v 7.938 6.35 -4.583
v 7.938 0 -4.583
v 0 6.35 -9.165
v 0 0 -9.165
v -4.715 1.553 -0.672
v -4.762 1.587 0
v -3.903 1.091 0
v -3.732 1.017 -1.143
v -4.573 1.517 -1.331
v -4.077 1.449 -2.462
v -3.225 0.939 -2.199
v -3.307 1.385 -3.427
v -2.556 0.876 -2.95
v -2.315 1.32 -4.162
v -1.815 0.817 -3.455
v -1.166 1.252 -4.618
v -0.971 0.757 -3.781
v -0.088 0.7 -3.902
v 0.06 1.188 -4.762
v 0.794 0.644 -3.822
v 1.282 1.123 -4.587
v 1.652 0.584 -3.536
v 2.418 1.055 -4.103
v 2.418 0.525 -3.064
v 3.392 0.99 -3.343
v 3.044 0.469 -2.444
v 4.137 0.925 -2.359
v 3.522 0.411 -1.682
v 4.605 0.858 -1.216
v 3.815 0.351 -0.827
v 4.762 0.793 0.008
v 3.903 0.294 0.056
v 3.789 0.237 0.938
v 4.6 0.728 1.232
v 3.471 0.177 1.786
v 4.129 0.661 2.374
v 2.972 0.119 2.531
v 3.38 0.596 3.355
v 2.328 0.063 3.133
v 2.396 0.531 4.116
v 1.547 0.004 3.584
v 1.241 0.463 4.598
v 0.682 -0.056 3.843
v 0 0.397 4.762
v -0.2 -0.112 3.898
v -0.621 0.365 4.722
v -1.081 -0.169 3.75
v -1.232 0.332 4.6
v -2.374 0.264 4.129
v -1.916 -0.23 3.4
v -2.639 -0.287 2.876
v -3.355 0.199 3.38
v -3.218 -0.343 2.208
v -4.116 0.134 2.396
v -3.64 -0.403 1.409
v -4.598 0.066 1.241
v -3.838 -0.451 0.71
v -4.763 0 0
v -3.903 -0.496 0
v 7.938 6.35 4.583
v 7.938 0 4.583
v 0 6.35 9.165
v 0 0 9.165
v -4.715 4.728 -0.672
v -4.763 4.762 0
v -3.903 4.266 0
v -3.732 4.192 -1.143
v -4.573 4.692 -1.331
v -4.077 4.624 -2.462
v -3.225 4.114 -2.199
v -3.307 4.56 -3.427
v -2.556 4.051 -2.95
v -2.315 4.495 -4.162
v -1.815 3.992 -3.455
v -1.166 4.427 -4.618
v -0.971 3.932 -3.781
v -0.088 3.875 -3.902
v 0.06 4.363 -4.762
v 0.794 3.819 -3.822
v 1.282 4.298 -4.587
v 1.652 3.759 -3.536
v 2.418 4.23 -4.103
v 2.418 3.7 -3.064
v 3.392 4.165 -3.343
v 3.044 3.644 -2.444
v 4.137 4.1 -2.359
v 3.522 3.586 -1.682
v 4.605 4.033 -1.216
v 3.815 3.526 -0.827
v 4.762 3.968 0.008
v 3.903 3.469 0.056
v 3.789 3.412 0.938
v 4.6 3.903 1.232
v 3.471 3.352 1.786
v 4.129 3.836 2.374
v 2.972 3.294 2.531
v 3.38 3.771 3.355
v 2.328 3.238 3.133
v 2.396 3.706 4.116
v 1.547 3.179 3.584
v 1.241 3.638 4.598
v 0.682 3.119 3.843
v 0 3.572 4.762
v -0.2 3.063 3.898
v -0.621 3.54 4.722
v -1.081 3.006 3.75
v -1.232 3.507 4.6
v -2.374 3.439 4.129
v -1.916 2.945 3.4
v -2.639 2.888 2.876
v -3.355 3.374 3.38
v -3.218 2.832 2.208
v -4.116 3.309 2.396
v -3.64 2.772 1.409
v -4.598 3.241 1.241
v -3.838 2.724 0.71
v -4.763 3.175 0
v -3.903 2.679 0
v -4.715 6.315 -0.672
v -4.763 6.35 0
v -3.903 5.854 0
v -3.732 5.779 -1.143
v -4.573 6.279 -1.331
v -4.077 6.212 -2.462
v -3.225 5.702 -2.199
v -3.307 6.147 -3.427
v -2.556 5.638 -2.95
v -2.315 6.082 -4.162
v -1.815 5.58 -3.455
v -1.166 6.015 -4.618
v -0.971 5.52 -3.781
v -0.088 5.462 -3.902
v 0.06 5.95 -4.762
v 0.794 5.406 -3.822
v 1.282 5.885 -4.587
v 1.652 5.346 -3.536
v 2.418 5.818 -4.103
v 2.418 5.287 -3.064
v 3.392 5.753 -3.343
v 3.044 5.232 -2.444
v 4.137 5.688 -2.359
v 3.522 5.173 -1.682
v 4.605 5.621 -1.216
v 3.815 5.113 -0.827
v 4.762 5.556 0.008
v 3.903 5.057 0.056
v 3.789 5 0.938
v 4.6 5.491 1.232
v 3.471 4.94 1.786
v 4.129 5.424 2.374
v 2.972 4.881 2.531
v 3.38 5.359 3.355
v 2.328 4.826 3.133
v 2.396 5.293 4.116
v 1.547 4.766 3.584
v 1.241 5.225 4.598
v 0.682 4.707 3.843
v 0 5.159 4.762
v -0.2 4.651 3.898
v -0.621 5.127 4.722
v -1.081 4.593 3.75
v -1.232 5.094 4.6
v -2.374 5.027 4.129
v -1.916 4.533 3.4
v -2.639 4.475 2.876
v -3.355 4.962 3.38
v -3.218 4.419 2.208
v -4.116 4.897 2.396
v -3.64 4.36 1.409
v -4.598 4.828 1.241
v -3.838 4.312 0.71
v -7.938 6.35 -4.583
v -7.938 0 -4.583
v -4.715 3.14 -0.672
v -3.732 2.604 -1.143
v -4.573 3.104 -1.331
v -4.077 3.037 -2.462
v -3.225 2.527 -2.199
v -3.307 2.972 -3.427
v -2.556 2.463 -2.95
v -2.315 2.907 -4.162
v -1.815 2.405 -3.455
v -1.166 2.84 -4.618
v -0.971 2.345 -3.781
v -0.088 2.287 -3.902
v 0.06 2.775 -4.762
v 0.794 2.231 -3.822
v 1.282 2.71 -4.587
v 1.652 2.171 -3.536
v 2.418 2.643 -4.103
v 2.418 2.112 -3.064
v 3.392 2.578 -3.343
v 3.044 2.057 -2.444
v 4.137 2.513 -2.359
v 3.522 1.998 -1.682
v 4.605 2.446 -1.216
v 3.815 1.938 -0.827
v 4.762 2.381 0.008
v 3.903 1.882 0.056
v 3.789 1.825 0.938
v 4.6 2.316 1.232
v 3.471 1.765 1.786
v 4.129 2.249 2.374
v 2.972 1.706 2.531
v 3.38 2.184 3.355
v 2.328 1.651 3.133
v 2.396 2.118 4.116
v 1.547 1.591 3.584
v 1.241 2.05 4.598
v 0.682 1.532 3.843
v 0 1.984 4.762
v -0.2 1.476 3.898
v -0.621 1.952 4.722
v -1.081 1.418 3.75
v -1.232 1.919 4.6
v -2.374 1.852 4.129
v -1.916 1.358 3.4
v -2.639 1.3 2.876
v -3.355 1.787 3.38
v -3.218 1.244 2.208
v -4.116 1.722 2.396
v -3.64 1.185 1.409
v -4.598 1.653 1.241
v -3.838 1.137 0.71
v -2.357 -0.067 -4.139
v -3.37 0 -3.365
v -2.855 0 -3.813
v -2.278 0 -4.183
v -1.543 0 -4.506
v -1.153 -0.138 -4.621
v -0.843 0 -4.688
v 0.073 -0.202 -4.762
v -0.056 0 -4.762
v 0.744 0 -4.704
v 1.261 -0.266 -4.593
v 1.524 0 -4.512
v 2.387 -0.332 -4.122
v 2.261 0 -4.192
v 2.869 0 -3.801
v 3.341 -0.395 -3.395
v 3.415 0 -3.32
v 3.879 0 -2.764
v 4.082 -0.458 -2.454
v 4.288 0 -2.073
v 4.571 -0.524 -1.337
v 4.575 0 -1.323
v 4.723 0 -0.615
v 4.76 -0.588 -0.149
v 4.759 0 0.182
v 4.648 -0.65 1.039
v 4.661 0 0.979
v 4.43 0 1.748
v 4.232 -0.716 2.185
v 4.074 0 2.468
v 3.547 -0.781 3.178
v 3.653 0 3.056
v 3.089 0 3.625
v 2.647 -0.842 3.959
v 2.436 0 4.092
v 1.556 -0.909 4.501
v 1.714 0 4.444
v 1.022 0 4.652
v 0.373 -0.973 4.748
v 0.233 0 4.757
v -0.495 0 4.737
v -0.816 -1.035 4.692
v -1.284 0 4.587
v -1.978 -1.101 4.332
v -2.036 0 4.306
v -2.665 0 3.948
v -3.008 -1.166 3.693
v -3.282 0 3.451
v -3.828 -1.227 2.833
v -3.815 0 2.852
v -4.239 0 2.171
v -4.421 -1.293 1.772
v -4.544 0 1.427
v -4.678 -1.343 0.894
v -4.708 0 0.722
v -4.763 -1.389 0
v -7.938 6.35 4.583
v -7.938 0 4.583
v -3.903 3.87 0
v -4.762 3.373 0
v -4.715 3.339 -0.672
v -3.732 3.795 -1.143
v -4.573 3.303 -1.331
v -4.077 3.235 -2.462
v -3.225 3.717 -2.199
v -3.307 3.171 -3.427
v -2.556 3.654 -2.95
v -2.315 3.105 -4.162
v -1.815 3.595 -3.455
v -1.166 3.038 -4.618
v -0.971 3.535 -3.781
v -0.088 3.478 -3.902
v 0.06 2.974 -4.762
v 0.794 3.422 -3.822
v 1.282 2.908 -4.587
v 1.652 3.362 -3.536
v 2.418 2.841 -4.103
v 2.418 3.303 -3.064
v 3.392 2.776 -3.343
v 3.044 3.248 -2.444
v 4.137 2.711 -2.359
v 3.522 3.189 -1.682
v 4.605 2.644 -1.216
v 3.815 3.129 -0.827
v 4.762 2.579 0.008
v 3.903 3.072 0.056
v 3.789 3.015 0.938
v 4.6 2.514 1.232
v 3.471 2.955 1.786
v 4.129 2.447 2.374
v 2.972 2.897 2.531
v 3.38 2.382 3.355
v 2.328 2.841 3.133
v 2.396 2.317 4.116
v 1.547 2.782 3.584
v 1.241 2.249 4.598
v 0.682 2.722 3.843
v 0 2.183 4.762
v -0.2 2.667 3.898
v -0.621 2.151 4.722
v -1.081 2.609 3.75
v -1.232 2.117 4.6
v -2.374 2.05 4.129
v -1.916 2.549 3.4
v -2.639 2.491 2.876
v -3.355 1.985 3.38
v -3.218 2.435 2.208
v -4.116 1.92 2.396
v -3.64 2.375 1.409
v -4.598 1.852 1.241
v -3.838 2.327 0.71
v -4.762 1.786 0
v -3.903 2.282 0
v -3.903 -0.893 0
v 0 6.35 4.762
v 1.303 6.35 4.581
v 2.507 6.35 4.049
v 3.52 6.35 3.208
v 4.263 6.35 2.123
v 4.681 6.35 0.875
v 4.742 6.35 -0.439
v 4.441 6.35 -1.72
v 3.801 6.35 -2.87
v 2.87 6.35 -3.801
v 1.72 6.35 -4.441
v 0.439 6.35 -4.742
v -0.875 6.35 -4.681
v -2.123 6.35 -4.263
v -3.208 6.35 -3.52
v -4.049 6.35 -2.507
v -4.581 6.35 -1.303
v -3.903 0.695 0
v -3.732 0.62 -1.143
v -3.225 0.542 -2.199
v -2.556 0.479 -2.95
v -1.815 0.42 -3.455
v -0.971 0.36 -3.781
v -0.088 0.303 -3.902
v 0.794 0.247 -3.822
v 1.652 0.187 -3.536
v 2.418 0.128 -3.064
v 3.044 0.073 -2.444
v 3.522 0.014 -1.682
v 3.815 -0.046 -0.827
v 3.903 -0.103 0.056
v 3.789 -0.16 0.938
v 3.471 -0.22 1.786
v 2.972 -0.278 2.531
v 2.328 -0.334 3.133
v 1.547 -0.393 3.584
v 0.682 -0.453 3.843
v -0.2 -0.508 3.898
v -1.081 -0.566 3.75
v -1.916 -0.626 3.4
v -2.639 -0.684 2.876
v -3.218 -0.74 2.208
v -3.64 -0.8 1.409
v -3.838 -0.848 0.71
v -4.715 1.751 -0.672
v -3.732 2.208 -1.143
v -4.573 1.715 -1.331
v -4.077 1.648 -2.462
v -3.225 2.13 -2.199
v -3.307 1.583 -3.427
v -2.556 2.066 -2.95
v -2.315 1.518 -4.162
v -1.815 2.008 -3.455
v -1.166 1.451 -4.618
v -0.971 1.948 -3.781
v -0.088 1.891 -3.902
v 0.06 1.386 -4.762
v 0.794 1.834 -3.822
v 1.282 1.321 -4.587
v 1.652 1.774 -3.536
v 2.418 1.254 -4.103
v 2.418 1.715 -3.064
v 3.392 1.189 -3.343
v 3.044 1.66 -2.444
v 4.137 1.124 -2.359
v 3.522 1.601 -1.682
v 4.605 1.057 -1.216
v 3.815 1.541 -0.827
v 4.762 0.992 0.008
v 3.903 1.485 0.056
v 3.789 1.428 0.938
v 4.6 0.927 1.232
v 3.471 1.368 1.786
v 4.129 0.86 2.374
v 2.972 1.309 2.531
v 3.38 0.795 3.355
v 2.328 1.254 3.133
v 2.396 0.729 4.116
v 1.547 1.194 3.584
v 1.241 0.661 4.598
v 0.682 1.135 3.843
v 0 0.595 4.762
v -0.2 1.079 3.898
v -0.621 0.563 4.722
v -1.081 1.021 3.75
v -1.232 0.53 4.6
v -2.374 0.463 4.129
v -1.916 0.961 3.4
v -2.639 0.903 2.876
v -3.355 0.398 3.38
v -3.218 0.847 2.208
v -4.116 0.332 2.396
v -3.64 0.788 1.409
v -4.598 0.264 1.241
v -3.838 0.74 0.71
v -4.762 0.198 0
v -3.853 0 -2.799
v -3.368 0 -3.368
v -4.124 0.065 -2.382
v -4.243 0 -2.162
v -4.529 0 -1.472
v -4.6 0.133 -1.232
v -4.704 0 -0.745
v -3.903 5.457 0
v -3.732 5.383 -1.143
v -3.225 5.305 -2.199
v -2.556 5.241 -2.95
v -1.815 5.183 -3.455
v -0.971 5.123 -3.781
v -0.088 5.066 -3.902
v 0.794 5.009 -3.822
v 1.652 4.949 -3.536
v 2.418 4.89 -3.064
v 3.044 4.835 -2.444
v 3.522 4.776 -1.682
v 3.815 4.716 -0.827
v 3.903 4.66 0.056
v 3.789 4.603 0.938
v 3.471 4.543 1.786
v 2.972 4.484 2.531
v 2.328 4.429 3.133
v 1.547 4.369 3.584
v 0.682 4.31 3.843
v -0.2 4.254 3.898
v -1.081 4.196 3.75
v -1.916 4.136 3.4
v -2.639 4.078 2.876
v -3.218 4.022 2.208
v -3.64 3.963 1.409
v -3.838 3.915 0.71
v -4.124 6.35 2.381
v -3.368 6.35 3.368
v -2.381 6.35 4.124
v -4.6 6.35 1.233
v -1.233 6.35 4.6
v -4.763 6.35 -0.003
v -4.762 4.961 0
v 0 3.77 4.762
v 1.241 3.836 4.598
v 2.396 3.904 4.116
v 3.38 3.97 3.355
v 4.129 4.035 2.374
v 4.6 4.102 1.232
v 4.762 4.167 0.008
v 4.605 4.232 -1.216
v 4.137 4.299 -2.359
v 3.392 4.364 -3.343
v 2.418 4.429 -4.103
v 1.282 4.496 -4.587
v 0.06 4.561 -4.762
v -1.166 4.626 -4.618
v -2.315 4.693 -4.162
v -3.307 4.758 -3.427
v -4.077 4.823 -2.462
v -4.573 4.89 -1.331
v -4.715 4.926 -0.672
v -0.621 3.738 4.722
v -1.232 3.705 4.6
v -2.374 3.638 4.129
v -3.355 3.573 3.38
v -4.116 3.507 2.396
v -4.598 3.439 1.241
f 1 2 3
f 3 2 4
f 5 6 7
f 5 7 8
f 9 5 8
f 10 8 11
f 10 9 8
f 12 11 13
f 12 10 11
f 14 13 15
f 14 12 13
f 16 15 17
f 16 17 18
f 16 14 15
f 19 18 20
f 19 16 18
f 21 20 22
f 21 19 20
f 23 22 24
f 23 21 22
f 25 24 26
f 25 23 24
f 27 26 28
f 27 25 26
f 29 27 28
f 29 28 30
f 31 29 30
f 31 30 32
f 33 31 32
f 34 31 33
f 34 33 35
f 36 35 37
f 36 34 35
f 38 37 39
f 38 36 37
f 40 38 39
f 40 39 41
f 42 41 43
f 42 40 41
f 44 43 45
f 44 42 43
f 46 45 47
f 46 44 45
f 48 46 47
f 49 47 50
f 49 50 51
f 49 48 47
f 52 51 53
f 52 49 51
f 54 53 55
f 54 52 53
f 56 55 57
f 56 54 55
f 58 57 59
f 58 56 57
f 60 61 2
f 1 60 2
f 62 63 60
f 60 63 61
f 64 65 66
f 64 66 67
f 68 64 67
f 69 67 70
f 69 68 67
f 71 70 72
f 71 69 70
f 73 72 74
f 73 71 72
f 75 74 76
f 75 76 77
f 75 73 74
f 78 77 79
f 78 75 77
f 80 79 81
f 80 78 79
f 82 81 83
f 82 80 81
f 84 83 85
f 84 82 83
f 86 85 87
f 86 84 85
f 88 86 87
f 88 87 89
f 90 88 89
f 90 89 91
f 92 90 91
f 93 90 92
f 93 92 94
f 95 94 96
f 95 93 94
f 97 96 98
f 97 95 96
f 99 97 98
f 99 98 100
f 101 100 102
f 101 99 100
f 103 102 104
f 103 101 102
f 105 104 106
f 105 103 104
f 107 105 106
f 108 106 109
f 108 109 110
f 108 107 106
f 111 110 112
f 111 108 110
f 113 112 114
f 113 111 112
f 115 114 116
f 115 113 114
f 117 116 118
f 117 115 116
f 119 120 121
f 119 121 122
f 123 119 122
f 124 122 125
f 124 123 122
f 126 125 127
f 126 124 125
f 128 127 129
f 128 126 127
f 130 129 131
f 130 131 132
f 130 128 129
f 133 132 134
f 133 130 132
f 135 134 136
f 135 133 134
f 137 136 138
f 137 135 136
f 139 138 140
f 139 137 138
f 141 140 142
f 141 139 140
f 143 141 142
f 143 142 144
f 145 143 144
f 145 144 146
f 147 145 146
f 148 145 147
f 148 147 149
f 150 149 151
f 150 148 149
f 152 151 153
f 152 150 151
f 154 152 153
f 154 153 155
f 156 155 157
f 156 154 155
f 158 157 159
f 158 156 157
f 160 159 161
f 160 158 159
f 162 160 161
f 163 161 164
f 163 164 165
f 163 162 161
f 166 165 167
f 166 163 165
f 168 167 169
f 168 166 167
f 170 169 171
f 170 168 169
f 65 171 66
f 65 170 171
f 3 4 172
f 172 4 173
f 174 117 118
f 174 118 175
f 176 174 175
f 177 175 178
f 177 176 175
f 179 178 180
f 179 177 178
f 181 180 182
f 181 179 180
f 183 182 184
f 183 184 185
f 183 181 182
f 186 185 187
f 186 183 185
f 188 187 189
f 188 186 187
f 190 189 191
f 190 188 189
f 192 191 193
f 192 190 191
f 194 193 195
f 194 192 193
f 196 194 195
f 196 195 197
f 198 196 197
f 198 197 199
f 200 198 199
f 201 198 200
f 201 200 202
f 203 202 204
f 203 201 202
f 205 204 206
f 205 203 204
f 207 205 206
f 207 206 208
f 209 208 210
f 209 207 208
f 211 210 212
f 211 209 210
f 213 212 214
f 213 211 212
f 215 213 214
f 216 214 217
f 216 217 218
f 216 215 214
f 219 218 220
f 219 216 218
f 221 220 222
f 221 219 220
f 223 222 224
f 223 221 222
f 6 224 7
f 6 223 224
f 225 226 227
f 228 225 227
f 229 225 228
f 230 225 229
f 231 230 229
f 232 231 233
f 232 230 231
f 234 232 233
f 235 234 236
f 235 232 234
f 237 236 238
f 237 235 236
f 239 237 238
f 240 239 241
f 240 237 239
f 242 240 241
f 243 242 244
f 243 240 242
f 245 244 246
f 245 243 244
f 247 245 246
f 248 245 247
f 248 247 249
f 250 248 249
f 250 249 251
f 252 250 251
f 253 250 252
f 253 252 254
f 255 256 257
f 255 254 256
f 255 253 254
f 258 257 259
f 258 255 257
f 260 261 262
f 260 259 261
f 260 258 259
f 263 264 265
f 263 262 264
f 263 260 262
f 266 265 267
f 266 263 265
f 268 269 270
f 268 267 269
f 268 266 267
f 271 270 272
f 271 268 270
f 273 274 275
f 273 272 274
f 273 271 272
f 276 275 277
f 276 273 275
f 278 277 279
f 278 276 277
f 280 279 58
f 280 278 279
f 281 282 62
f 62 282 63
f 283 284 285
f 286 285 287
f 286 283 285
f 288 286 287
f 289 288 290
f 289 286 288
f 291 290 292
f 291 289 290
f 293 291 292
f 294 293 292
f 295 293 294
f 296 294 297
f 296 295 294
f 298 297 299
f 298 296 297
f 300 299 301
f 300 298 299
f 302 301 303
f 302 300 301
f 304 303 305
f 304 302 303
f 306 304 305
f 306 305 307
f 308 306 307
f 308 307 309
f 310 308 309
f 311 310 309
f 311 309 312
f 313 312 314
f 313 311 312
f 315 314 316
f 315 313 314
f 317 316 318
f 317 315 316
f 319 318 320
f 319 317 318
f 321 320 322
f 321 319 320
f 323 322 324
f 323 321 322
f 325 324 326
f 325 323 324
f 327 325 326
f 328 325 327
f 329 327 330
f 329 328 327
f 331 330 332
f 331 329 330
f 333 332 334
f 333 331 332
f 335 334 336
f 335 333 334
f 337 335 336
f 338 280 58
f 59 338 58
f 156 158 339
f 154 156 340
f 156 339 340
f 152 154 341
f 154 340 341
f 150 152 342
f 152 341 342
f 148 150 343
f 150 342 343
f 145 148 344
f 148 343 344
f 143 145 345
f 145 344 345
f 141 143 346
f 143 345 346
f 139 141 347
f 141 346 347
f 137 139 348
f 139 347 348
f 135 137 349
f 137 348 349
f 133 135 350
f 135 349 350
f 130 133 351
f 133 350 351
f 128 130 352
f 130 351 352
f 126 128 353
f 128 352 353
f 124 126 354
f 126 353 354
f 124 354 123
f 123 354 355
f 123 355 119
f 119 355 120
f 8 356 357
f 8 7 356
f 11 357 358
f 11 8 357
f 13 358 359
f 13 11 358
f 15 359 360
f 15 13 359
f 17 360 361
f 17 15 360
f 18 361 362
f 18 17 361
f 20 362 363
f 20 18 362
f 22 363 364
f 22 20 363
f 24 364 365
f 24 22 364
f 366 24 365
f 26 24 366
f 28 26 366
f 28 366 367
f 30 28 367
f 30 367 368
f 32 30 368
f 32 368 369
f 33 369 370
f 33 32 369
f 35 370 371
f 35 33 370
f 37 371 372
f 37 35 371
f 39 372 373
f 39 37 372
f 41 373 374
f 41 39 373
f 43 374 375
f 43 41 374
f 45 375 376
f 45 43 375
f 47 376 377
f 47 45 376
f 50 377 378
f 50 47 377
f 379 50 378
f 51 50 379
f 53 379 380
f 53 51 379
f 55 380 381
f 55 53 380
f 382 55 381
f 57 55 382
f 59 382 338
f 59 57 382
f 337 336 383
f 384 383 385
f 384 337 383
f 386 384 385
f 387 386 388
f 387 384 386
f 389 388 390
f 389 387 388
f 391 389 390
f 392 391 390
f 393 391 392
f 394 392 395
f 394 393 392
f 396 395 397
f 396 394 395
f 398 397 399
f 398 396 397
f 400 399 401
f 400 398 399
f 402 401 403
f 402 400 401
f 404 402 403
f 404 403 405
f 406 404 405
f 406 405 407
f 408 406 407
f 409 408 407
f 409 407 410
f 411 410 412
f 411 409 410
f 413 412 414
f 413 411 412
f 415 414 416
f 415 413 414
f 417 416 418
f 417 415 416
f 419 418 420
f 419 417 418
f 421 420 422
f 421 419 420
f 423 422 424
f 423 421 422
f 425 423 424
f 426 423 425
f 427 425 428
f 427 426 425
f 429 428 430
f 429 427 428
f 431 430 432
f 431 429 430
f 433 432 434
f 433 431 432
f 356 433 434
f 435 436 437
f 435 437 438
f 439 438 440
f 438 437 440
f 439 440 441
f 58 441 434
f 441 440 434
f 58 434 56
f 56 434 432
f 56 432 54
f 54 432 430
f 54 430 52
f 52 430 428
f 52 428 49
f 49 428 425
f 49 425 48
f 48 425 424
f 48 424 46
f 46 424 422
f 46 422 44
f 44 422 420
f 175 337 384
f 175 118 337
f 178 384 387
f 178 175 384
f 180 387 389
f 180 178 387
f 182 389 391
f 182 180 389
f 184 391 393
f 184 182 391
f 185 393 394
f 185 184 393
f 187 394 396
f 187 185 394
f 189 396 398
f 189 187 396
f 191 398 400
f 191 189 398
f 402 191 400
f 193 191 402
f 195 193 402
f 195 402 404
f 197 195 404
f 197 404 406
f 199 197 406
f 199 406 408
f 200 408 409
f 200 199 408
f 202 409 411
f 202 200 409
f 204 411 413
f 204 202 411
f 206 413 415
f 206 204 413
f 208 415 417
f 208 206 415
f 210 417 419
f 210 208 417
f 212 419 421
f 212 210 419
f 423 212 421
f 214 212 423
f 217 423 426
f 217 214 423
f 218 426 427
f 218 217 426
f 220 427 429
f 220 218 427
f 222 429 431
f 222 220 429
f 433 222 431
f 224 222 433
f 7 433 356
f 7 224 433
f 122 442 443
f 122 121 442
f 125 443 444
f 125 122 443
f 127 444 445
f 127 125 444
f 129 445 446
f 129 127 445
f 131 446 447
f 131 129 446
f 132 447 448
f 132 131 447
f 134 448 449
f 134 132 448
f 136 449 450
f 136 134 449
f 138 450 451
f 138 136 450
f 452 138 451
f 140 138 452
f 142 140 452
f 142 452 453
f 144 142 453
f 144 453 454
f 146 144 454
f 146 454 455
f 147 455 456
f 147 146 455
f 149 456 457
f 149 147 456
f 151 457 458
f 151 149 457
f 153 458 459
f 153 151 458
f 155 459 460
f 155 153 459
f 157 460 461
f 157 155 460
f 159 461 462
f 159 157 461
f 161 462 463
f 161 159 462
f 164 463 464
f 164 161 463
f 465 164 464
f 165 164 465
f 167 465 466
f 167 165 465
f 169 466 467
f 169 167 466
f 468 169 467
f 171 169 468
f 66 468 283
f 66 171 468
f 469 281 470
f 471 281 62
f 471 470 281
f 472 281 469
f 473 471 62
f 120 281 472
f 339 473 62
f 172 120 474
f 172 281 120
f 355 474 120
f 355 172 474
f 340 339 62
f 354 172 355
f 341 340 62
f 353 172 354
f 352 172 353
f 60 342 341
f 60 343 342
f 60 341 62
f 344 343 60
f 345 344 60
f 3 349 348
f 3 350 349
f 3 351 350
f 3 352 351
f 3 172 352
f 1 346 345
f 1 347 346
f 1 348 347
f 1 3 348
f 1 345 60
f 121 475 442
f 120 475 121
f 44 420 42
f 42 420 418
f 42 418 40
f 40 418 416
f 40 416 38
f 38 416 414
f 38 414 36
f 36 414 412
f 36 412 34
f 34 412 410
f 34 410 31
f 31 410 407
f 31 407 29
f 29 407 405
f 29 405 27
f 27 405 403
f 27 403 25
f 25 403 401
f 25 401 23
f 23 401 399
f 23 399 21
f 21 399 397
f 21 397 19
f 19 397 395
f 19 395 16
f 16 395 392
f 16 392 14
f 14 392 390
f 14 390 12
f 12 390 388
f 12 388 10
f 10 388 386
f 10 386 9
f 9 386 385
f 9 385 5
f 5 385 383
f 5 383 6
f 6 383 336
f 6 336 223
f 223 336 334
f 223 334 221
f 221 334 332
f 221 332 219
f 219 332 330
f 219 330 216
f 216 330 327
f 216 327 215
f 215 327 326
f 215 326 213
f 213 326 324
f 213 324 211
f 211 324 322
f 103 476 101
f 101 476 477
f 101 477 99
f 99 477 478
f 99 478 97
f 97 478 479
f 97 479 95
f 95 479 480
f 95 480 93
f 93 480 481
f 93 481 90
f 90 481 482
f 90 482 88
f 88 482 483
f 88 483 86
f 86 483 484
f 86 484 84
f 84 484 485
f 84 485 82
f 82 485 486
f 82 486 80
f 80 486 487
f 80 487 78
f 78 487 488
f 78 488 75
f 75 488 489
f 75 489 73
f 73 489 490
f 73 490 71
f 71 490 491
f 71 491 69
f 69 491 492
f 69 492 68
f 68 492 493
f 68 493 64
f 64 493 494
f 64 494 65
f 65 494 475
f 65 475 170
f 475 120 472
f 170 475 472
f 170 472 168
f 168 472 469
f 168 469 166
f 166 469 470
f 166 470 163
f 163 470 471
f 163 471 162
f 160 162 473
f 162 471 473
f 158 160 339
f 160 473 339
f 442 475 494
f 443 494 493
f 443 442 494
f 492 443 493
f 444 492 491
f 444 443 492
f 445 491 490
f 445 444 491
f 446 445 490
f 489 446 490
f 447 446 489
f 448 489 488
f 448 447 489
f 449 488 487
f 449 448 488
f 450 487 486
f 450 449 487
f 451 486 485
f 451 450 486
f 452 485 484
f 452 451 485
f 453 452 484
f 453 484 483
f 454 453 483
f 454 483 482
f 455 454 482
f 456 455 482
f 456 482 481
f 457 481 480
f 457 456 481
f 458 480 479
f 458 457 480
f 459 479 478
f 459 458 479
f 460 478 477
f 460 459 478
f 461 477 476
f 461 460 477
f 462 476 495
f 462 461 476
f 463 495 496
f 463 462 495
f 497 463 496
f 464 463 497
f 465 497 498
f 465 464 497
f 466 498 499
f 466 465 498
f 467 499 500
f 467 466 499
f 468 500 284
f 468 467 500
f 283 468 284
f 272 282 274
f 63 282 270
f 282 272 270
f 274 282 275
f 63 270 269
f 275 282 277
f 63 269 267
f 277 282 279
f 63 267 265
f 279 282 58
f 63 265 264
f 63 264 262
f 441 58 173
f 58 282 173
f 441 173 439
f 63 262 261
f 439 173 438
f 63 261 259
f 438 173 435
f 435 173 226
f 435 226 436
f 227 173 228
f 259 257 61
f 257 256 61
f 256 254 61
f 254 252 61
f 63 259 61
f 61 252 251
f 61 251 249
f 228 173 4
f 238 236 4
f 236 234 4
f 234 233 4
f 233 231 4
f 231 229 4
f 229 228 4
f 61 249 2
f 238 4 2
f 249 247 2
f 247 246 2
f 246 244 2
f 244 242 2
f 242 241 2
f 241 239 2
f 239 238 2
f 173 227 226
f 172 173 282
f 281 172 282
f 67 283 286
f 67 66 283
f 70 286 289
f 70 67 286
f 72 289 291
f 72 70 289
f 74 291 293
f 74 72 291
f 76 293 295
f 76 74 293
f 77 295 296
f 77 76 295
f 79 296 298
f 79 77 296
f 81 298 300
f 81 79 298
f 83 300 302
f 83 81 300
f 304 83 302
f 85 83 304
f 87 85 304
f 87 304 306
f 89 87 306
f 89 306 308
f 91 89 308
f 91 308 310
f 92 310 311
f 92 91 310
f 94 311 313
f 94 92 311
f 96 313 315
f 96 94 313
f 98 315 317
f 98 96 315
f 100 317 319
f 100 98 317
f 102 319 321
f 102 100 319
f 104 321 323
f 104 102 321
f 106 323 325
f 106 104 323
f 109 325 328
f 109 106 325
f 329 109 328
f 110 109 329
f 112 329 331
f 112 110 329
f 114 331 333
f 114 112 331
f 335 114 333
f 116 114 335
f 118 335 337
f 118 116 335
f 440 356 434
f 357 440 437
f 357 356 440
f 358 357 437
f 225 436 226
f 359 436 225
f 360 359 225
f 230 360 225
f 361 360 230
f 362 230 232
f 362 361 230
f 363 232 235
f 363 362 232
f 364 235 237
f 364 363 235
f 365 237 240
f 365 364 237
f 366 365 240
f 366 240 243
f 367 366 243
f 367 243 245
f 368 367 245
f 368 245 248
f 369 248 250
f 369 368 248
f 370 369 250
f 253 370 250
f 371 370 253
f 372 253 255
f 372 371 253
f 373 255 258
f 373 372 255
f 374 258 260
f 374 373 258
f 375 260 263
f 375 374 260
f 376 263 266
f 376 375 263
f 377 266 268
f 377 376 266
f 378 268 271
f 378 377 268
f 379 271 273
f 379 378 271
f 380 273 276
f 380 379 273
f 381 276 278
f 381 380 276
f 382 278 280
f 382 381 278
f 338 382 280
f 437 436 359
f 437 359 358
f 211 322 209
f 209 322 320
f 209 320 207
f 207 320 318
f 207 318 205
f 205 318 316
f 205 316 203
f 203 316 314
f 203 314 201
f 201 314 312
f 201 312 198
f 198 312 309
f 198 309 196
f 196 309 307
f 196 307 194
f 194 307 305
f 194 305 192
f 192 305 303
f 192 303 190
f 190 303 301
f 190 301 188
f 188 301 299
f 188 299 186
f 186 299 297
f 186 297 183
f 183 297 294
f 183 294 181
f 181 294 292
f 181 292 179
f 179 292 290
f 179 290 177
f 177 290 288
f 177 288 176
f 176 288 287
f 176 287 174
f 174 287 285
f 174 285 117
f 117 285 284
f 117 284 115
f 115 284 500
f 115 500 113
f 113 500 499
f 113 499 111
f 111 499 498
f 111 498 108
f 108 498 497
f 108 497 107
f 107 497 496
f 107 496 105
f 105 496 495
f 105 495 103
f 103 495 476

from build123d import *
from build123d.topology import SkipClean

# Parameters (mm, degrees)
BOSS_EXTRUDE1_DEPTH = 6.35
SKETCH2_R           = 4.7625
CUT_EXTRUDE1_DEPTH  = 14.68691399
THREAD1_PITCH       = 1.5875


with BuildPart() as part:
    # Sketch1 → Boss-Extrude1 (new body)
    with BuildSketch(Plane(origin=(0, 0, 0), x_dir=(1, 0, 0), z_dir=(0, 1, 0))):
        Polygon((7.9375, -4.582717762), (7.9375, 4.582717762), (0, 9.165435523), (-7.9375, 4.582717762), (-7.9375, -4.582717762), (0, -9.165435523), align=None)
    extrude(amount=BOSS_EXTRUDE1_DEPTH)

    # Sketch2 → Cut-Extrude1 (cut, through all)
    with BuildSketch(Plane(origin=(0, 6.35, 0), x_dir=(1, 0, 0), z_dir=(0, 1, 0))):
        with Locations(Location((0, 0, 0), (0, 0, 270))):
            Circle(SKETCH2_R)
    extrude(amount=-CUT_EXTRUDE1_DEPTH, mode=Mode.SUBTRACT)

    # Thread1: the profile of Thread Profile1 profile screwed along a right-hand helix of 4 turns, 8 arcs to a turn; built about Z, then put on its axis
    with SkipClean():  # the faces are left unmerged after this step: merging them gives an invalid solid
        thread1_z = Axis((0, 0, 0), (0, 0, 1))
        thread1_corners = [(4.7628, 0, -0.000173205), (4.7628, 0, 1.389235701), (3.903240423, 0, 0.892968748), (3.903240423, 0, 0.496093748)]
        with BuildLine(mode=Mode.PRIVATE) as thread1_profile:
            Line(thread1_corners[0], thread1_corners[1])
            Line(thread1_corners[1], thread1_corners[2])
            Line(thread1_corners[2], thread1_corners[3])
            Line(thread1_corners[3], thread1_corners[0])
        thread1_cap = Face(thread1_profile.wire())
        thread1_turn_angles = [0, 22.5, 45, 67.5, 90, 112.5, 135, 157.5, 180, 202.5, 225, 247.5, 270, 292.5, 315, 337.5, 360]
        thread1_turn_weights = [1, 0.9238795325112867, 1, 0.9238795325112867, 1, 0.9238795325112867, 1, 0.9238795325112867, 1, 0.9238795325112867, 1, 0.9238795325112867, 1, 0.9238795325112867, 1, 0.9238795325112867, 1]
        thread1_turn_rails = [Edge.make_bspline([Vector(p[0], p[1], 0).rotate(thread1_z, thread1_turn_angles[k]) / thread1_turn_weights[k] + Vector(0, 0, p[2] + THREAD1_PITCH * thread1_turn_angles[k] / 360) for k in range(17)], [0, 0, 0, 1, 1, 2, 2, 3, 3, 4, 4, 5, 5, 6, 6, 7, 7, 8, 8, 8], 2, thread1_turn_weights) for p in thread1_corners]
        thread1_turn_sides = [Face.make_surface_from_curves(thread1_turn_rails[p[0]], thread1_turn_rails[p[1]]) for p in [(0, 1), (1, 2), (2, 3), (3, 0)]]
        thread1 = Plane(origin=(0, 6.35, 0), x_dir=(-1, 0, 0), z_dir=(0, -1, 0)) * Solid(Shell([*[p.moved(Location((0, 0, THREAD1_PITCH * i))) for i in range(4) for p in thread1_turn_sides], thread1_cap, thread1_cap.rotate(thread1_z, 1440).moved(Location((0, 0, THREAD1_PITCH * 1440 / 360)))]))
        add(thread1)


solid = part.part
